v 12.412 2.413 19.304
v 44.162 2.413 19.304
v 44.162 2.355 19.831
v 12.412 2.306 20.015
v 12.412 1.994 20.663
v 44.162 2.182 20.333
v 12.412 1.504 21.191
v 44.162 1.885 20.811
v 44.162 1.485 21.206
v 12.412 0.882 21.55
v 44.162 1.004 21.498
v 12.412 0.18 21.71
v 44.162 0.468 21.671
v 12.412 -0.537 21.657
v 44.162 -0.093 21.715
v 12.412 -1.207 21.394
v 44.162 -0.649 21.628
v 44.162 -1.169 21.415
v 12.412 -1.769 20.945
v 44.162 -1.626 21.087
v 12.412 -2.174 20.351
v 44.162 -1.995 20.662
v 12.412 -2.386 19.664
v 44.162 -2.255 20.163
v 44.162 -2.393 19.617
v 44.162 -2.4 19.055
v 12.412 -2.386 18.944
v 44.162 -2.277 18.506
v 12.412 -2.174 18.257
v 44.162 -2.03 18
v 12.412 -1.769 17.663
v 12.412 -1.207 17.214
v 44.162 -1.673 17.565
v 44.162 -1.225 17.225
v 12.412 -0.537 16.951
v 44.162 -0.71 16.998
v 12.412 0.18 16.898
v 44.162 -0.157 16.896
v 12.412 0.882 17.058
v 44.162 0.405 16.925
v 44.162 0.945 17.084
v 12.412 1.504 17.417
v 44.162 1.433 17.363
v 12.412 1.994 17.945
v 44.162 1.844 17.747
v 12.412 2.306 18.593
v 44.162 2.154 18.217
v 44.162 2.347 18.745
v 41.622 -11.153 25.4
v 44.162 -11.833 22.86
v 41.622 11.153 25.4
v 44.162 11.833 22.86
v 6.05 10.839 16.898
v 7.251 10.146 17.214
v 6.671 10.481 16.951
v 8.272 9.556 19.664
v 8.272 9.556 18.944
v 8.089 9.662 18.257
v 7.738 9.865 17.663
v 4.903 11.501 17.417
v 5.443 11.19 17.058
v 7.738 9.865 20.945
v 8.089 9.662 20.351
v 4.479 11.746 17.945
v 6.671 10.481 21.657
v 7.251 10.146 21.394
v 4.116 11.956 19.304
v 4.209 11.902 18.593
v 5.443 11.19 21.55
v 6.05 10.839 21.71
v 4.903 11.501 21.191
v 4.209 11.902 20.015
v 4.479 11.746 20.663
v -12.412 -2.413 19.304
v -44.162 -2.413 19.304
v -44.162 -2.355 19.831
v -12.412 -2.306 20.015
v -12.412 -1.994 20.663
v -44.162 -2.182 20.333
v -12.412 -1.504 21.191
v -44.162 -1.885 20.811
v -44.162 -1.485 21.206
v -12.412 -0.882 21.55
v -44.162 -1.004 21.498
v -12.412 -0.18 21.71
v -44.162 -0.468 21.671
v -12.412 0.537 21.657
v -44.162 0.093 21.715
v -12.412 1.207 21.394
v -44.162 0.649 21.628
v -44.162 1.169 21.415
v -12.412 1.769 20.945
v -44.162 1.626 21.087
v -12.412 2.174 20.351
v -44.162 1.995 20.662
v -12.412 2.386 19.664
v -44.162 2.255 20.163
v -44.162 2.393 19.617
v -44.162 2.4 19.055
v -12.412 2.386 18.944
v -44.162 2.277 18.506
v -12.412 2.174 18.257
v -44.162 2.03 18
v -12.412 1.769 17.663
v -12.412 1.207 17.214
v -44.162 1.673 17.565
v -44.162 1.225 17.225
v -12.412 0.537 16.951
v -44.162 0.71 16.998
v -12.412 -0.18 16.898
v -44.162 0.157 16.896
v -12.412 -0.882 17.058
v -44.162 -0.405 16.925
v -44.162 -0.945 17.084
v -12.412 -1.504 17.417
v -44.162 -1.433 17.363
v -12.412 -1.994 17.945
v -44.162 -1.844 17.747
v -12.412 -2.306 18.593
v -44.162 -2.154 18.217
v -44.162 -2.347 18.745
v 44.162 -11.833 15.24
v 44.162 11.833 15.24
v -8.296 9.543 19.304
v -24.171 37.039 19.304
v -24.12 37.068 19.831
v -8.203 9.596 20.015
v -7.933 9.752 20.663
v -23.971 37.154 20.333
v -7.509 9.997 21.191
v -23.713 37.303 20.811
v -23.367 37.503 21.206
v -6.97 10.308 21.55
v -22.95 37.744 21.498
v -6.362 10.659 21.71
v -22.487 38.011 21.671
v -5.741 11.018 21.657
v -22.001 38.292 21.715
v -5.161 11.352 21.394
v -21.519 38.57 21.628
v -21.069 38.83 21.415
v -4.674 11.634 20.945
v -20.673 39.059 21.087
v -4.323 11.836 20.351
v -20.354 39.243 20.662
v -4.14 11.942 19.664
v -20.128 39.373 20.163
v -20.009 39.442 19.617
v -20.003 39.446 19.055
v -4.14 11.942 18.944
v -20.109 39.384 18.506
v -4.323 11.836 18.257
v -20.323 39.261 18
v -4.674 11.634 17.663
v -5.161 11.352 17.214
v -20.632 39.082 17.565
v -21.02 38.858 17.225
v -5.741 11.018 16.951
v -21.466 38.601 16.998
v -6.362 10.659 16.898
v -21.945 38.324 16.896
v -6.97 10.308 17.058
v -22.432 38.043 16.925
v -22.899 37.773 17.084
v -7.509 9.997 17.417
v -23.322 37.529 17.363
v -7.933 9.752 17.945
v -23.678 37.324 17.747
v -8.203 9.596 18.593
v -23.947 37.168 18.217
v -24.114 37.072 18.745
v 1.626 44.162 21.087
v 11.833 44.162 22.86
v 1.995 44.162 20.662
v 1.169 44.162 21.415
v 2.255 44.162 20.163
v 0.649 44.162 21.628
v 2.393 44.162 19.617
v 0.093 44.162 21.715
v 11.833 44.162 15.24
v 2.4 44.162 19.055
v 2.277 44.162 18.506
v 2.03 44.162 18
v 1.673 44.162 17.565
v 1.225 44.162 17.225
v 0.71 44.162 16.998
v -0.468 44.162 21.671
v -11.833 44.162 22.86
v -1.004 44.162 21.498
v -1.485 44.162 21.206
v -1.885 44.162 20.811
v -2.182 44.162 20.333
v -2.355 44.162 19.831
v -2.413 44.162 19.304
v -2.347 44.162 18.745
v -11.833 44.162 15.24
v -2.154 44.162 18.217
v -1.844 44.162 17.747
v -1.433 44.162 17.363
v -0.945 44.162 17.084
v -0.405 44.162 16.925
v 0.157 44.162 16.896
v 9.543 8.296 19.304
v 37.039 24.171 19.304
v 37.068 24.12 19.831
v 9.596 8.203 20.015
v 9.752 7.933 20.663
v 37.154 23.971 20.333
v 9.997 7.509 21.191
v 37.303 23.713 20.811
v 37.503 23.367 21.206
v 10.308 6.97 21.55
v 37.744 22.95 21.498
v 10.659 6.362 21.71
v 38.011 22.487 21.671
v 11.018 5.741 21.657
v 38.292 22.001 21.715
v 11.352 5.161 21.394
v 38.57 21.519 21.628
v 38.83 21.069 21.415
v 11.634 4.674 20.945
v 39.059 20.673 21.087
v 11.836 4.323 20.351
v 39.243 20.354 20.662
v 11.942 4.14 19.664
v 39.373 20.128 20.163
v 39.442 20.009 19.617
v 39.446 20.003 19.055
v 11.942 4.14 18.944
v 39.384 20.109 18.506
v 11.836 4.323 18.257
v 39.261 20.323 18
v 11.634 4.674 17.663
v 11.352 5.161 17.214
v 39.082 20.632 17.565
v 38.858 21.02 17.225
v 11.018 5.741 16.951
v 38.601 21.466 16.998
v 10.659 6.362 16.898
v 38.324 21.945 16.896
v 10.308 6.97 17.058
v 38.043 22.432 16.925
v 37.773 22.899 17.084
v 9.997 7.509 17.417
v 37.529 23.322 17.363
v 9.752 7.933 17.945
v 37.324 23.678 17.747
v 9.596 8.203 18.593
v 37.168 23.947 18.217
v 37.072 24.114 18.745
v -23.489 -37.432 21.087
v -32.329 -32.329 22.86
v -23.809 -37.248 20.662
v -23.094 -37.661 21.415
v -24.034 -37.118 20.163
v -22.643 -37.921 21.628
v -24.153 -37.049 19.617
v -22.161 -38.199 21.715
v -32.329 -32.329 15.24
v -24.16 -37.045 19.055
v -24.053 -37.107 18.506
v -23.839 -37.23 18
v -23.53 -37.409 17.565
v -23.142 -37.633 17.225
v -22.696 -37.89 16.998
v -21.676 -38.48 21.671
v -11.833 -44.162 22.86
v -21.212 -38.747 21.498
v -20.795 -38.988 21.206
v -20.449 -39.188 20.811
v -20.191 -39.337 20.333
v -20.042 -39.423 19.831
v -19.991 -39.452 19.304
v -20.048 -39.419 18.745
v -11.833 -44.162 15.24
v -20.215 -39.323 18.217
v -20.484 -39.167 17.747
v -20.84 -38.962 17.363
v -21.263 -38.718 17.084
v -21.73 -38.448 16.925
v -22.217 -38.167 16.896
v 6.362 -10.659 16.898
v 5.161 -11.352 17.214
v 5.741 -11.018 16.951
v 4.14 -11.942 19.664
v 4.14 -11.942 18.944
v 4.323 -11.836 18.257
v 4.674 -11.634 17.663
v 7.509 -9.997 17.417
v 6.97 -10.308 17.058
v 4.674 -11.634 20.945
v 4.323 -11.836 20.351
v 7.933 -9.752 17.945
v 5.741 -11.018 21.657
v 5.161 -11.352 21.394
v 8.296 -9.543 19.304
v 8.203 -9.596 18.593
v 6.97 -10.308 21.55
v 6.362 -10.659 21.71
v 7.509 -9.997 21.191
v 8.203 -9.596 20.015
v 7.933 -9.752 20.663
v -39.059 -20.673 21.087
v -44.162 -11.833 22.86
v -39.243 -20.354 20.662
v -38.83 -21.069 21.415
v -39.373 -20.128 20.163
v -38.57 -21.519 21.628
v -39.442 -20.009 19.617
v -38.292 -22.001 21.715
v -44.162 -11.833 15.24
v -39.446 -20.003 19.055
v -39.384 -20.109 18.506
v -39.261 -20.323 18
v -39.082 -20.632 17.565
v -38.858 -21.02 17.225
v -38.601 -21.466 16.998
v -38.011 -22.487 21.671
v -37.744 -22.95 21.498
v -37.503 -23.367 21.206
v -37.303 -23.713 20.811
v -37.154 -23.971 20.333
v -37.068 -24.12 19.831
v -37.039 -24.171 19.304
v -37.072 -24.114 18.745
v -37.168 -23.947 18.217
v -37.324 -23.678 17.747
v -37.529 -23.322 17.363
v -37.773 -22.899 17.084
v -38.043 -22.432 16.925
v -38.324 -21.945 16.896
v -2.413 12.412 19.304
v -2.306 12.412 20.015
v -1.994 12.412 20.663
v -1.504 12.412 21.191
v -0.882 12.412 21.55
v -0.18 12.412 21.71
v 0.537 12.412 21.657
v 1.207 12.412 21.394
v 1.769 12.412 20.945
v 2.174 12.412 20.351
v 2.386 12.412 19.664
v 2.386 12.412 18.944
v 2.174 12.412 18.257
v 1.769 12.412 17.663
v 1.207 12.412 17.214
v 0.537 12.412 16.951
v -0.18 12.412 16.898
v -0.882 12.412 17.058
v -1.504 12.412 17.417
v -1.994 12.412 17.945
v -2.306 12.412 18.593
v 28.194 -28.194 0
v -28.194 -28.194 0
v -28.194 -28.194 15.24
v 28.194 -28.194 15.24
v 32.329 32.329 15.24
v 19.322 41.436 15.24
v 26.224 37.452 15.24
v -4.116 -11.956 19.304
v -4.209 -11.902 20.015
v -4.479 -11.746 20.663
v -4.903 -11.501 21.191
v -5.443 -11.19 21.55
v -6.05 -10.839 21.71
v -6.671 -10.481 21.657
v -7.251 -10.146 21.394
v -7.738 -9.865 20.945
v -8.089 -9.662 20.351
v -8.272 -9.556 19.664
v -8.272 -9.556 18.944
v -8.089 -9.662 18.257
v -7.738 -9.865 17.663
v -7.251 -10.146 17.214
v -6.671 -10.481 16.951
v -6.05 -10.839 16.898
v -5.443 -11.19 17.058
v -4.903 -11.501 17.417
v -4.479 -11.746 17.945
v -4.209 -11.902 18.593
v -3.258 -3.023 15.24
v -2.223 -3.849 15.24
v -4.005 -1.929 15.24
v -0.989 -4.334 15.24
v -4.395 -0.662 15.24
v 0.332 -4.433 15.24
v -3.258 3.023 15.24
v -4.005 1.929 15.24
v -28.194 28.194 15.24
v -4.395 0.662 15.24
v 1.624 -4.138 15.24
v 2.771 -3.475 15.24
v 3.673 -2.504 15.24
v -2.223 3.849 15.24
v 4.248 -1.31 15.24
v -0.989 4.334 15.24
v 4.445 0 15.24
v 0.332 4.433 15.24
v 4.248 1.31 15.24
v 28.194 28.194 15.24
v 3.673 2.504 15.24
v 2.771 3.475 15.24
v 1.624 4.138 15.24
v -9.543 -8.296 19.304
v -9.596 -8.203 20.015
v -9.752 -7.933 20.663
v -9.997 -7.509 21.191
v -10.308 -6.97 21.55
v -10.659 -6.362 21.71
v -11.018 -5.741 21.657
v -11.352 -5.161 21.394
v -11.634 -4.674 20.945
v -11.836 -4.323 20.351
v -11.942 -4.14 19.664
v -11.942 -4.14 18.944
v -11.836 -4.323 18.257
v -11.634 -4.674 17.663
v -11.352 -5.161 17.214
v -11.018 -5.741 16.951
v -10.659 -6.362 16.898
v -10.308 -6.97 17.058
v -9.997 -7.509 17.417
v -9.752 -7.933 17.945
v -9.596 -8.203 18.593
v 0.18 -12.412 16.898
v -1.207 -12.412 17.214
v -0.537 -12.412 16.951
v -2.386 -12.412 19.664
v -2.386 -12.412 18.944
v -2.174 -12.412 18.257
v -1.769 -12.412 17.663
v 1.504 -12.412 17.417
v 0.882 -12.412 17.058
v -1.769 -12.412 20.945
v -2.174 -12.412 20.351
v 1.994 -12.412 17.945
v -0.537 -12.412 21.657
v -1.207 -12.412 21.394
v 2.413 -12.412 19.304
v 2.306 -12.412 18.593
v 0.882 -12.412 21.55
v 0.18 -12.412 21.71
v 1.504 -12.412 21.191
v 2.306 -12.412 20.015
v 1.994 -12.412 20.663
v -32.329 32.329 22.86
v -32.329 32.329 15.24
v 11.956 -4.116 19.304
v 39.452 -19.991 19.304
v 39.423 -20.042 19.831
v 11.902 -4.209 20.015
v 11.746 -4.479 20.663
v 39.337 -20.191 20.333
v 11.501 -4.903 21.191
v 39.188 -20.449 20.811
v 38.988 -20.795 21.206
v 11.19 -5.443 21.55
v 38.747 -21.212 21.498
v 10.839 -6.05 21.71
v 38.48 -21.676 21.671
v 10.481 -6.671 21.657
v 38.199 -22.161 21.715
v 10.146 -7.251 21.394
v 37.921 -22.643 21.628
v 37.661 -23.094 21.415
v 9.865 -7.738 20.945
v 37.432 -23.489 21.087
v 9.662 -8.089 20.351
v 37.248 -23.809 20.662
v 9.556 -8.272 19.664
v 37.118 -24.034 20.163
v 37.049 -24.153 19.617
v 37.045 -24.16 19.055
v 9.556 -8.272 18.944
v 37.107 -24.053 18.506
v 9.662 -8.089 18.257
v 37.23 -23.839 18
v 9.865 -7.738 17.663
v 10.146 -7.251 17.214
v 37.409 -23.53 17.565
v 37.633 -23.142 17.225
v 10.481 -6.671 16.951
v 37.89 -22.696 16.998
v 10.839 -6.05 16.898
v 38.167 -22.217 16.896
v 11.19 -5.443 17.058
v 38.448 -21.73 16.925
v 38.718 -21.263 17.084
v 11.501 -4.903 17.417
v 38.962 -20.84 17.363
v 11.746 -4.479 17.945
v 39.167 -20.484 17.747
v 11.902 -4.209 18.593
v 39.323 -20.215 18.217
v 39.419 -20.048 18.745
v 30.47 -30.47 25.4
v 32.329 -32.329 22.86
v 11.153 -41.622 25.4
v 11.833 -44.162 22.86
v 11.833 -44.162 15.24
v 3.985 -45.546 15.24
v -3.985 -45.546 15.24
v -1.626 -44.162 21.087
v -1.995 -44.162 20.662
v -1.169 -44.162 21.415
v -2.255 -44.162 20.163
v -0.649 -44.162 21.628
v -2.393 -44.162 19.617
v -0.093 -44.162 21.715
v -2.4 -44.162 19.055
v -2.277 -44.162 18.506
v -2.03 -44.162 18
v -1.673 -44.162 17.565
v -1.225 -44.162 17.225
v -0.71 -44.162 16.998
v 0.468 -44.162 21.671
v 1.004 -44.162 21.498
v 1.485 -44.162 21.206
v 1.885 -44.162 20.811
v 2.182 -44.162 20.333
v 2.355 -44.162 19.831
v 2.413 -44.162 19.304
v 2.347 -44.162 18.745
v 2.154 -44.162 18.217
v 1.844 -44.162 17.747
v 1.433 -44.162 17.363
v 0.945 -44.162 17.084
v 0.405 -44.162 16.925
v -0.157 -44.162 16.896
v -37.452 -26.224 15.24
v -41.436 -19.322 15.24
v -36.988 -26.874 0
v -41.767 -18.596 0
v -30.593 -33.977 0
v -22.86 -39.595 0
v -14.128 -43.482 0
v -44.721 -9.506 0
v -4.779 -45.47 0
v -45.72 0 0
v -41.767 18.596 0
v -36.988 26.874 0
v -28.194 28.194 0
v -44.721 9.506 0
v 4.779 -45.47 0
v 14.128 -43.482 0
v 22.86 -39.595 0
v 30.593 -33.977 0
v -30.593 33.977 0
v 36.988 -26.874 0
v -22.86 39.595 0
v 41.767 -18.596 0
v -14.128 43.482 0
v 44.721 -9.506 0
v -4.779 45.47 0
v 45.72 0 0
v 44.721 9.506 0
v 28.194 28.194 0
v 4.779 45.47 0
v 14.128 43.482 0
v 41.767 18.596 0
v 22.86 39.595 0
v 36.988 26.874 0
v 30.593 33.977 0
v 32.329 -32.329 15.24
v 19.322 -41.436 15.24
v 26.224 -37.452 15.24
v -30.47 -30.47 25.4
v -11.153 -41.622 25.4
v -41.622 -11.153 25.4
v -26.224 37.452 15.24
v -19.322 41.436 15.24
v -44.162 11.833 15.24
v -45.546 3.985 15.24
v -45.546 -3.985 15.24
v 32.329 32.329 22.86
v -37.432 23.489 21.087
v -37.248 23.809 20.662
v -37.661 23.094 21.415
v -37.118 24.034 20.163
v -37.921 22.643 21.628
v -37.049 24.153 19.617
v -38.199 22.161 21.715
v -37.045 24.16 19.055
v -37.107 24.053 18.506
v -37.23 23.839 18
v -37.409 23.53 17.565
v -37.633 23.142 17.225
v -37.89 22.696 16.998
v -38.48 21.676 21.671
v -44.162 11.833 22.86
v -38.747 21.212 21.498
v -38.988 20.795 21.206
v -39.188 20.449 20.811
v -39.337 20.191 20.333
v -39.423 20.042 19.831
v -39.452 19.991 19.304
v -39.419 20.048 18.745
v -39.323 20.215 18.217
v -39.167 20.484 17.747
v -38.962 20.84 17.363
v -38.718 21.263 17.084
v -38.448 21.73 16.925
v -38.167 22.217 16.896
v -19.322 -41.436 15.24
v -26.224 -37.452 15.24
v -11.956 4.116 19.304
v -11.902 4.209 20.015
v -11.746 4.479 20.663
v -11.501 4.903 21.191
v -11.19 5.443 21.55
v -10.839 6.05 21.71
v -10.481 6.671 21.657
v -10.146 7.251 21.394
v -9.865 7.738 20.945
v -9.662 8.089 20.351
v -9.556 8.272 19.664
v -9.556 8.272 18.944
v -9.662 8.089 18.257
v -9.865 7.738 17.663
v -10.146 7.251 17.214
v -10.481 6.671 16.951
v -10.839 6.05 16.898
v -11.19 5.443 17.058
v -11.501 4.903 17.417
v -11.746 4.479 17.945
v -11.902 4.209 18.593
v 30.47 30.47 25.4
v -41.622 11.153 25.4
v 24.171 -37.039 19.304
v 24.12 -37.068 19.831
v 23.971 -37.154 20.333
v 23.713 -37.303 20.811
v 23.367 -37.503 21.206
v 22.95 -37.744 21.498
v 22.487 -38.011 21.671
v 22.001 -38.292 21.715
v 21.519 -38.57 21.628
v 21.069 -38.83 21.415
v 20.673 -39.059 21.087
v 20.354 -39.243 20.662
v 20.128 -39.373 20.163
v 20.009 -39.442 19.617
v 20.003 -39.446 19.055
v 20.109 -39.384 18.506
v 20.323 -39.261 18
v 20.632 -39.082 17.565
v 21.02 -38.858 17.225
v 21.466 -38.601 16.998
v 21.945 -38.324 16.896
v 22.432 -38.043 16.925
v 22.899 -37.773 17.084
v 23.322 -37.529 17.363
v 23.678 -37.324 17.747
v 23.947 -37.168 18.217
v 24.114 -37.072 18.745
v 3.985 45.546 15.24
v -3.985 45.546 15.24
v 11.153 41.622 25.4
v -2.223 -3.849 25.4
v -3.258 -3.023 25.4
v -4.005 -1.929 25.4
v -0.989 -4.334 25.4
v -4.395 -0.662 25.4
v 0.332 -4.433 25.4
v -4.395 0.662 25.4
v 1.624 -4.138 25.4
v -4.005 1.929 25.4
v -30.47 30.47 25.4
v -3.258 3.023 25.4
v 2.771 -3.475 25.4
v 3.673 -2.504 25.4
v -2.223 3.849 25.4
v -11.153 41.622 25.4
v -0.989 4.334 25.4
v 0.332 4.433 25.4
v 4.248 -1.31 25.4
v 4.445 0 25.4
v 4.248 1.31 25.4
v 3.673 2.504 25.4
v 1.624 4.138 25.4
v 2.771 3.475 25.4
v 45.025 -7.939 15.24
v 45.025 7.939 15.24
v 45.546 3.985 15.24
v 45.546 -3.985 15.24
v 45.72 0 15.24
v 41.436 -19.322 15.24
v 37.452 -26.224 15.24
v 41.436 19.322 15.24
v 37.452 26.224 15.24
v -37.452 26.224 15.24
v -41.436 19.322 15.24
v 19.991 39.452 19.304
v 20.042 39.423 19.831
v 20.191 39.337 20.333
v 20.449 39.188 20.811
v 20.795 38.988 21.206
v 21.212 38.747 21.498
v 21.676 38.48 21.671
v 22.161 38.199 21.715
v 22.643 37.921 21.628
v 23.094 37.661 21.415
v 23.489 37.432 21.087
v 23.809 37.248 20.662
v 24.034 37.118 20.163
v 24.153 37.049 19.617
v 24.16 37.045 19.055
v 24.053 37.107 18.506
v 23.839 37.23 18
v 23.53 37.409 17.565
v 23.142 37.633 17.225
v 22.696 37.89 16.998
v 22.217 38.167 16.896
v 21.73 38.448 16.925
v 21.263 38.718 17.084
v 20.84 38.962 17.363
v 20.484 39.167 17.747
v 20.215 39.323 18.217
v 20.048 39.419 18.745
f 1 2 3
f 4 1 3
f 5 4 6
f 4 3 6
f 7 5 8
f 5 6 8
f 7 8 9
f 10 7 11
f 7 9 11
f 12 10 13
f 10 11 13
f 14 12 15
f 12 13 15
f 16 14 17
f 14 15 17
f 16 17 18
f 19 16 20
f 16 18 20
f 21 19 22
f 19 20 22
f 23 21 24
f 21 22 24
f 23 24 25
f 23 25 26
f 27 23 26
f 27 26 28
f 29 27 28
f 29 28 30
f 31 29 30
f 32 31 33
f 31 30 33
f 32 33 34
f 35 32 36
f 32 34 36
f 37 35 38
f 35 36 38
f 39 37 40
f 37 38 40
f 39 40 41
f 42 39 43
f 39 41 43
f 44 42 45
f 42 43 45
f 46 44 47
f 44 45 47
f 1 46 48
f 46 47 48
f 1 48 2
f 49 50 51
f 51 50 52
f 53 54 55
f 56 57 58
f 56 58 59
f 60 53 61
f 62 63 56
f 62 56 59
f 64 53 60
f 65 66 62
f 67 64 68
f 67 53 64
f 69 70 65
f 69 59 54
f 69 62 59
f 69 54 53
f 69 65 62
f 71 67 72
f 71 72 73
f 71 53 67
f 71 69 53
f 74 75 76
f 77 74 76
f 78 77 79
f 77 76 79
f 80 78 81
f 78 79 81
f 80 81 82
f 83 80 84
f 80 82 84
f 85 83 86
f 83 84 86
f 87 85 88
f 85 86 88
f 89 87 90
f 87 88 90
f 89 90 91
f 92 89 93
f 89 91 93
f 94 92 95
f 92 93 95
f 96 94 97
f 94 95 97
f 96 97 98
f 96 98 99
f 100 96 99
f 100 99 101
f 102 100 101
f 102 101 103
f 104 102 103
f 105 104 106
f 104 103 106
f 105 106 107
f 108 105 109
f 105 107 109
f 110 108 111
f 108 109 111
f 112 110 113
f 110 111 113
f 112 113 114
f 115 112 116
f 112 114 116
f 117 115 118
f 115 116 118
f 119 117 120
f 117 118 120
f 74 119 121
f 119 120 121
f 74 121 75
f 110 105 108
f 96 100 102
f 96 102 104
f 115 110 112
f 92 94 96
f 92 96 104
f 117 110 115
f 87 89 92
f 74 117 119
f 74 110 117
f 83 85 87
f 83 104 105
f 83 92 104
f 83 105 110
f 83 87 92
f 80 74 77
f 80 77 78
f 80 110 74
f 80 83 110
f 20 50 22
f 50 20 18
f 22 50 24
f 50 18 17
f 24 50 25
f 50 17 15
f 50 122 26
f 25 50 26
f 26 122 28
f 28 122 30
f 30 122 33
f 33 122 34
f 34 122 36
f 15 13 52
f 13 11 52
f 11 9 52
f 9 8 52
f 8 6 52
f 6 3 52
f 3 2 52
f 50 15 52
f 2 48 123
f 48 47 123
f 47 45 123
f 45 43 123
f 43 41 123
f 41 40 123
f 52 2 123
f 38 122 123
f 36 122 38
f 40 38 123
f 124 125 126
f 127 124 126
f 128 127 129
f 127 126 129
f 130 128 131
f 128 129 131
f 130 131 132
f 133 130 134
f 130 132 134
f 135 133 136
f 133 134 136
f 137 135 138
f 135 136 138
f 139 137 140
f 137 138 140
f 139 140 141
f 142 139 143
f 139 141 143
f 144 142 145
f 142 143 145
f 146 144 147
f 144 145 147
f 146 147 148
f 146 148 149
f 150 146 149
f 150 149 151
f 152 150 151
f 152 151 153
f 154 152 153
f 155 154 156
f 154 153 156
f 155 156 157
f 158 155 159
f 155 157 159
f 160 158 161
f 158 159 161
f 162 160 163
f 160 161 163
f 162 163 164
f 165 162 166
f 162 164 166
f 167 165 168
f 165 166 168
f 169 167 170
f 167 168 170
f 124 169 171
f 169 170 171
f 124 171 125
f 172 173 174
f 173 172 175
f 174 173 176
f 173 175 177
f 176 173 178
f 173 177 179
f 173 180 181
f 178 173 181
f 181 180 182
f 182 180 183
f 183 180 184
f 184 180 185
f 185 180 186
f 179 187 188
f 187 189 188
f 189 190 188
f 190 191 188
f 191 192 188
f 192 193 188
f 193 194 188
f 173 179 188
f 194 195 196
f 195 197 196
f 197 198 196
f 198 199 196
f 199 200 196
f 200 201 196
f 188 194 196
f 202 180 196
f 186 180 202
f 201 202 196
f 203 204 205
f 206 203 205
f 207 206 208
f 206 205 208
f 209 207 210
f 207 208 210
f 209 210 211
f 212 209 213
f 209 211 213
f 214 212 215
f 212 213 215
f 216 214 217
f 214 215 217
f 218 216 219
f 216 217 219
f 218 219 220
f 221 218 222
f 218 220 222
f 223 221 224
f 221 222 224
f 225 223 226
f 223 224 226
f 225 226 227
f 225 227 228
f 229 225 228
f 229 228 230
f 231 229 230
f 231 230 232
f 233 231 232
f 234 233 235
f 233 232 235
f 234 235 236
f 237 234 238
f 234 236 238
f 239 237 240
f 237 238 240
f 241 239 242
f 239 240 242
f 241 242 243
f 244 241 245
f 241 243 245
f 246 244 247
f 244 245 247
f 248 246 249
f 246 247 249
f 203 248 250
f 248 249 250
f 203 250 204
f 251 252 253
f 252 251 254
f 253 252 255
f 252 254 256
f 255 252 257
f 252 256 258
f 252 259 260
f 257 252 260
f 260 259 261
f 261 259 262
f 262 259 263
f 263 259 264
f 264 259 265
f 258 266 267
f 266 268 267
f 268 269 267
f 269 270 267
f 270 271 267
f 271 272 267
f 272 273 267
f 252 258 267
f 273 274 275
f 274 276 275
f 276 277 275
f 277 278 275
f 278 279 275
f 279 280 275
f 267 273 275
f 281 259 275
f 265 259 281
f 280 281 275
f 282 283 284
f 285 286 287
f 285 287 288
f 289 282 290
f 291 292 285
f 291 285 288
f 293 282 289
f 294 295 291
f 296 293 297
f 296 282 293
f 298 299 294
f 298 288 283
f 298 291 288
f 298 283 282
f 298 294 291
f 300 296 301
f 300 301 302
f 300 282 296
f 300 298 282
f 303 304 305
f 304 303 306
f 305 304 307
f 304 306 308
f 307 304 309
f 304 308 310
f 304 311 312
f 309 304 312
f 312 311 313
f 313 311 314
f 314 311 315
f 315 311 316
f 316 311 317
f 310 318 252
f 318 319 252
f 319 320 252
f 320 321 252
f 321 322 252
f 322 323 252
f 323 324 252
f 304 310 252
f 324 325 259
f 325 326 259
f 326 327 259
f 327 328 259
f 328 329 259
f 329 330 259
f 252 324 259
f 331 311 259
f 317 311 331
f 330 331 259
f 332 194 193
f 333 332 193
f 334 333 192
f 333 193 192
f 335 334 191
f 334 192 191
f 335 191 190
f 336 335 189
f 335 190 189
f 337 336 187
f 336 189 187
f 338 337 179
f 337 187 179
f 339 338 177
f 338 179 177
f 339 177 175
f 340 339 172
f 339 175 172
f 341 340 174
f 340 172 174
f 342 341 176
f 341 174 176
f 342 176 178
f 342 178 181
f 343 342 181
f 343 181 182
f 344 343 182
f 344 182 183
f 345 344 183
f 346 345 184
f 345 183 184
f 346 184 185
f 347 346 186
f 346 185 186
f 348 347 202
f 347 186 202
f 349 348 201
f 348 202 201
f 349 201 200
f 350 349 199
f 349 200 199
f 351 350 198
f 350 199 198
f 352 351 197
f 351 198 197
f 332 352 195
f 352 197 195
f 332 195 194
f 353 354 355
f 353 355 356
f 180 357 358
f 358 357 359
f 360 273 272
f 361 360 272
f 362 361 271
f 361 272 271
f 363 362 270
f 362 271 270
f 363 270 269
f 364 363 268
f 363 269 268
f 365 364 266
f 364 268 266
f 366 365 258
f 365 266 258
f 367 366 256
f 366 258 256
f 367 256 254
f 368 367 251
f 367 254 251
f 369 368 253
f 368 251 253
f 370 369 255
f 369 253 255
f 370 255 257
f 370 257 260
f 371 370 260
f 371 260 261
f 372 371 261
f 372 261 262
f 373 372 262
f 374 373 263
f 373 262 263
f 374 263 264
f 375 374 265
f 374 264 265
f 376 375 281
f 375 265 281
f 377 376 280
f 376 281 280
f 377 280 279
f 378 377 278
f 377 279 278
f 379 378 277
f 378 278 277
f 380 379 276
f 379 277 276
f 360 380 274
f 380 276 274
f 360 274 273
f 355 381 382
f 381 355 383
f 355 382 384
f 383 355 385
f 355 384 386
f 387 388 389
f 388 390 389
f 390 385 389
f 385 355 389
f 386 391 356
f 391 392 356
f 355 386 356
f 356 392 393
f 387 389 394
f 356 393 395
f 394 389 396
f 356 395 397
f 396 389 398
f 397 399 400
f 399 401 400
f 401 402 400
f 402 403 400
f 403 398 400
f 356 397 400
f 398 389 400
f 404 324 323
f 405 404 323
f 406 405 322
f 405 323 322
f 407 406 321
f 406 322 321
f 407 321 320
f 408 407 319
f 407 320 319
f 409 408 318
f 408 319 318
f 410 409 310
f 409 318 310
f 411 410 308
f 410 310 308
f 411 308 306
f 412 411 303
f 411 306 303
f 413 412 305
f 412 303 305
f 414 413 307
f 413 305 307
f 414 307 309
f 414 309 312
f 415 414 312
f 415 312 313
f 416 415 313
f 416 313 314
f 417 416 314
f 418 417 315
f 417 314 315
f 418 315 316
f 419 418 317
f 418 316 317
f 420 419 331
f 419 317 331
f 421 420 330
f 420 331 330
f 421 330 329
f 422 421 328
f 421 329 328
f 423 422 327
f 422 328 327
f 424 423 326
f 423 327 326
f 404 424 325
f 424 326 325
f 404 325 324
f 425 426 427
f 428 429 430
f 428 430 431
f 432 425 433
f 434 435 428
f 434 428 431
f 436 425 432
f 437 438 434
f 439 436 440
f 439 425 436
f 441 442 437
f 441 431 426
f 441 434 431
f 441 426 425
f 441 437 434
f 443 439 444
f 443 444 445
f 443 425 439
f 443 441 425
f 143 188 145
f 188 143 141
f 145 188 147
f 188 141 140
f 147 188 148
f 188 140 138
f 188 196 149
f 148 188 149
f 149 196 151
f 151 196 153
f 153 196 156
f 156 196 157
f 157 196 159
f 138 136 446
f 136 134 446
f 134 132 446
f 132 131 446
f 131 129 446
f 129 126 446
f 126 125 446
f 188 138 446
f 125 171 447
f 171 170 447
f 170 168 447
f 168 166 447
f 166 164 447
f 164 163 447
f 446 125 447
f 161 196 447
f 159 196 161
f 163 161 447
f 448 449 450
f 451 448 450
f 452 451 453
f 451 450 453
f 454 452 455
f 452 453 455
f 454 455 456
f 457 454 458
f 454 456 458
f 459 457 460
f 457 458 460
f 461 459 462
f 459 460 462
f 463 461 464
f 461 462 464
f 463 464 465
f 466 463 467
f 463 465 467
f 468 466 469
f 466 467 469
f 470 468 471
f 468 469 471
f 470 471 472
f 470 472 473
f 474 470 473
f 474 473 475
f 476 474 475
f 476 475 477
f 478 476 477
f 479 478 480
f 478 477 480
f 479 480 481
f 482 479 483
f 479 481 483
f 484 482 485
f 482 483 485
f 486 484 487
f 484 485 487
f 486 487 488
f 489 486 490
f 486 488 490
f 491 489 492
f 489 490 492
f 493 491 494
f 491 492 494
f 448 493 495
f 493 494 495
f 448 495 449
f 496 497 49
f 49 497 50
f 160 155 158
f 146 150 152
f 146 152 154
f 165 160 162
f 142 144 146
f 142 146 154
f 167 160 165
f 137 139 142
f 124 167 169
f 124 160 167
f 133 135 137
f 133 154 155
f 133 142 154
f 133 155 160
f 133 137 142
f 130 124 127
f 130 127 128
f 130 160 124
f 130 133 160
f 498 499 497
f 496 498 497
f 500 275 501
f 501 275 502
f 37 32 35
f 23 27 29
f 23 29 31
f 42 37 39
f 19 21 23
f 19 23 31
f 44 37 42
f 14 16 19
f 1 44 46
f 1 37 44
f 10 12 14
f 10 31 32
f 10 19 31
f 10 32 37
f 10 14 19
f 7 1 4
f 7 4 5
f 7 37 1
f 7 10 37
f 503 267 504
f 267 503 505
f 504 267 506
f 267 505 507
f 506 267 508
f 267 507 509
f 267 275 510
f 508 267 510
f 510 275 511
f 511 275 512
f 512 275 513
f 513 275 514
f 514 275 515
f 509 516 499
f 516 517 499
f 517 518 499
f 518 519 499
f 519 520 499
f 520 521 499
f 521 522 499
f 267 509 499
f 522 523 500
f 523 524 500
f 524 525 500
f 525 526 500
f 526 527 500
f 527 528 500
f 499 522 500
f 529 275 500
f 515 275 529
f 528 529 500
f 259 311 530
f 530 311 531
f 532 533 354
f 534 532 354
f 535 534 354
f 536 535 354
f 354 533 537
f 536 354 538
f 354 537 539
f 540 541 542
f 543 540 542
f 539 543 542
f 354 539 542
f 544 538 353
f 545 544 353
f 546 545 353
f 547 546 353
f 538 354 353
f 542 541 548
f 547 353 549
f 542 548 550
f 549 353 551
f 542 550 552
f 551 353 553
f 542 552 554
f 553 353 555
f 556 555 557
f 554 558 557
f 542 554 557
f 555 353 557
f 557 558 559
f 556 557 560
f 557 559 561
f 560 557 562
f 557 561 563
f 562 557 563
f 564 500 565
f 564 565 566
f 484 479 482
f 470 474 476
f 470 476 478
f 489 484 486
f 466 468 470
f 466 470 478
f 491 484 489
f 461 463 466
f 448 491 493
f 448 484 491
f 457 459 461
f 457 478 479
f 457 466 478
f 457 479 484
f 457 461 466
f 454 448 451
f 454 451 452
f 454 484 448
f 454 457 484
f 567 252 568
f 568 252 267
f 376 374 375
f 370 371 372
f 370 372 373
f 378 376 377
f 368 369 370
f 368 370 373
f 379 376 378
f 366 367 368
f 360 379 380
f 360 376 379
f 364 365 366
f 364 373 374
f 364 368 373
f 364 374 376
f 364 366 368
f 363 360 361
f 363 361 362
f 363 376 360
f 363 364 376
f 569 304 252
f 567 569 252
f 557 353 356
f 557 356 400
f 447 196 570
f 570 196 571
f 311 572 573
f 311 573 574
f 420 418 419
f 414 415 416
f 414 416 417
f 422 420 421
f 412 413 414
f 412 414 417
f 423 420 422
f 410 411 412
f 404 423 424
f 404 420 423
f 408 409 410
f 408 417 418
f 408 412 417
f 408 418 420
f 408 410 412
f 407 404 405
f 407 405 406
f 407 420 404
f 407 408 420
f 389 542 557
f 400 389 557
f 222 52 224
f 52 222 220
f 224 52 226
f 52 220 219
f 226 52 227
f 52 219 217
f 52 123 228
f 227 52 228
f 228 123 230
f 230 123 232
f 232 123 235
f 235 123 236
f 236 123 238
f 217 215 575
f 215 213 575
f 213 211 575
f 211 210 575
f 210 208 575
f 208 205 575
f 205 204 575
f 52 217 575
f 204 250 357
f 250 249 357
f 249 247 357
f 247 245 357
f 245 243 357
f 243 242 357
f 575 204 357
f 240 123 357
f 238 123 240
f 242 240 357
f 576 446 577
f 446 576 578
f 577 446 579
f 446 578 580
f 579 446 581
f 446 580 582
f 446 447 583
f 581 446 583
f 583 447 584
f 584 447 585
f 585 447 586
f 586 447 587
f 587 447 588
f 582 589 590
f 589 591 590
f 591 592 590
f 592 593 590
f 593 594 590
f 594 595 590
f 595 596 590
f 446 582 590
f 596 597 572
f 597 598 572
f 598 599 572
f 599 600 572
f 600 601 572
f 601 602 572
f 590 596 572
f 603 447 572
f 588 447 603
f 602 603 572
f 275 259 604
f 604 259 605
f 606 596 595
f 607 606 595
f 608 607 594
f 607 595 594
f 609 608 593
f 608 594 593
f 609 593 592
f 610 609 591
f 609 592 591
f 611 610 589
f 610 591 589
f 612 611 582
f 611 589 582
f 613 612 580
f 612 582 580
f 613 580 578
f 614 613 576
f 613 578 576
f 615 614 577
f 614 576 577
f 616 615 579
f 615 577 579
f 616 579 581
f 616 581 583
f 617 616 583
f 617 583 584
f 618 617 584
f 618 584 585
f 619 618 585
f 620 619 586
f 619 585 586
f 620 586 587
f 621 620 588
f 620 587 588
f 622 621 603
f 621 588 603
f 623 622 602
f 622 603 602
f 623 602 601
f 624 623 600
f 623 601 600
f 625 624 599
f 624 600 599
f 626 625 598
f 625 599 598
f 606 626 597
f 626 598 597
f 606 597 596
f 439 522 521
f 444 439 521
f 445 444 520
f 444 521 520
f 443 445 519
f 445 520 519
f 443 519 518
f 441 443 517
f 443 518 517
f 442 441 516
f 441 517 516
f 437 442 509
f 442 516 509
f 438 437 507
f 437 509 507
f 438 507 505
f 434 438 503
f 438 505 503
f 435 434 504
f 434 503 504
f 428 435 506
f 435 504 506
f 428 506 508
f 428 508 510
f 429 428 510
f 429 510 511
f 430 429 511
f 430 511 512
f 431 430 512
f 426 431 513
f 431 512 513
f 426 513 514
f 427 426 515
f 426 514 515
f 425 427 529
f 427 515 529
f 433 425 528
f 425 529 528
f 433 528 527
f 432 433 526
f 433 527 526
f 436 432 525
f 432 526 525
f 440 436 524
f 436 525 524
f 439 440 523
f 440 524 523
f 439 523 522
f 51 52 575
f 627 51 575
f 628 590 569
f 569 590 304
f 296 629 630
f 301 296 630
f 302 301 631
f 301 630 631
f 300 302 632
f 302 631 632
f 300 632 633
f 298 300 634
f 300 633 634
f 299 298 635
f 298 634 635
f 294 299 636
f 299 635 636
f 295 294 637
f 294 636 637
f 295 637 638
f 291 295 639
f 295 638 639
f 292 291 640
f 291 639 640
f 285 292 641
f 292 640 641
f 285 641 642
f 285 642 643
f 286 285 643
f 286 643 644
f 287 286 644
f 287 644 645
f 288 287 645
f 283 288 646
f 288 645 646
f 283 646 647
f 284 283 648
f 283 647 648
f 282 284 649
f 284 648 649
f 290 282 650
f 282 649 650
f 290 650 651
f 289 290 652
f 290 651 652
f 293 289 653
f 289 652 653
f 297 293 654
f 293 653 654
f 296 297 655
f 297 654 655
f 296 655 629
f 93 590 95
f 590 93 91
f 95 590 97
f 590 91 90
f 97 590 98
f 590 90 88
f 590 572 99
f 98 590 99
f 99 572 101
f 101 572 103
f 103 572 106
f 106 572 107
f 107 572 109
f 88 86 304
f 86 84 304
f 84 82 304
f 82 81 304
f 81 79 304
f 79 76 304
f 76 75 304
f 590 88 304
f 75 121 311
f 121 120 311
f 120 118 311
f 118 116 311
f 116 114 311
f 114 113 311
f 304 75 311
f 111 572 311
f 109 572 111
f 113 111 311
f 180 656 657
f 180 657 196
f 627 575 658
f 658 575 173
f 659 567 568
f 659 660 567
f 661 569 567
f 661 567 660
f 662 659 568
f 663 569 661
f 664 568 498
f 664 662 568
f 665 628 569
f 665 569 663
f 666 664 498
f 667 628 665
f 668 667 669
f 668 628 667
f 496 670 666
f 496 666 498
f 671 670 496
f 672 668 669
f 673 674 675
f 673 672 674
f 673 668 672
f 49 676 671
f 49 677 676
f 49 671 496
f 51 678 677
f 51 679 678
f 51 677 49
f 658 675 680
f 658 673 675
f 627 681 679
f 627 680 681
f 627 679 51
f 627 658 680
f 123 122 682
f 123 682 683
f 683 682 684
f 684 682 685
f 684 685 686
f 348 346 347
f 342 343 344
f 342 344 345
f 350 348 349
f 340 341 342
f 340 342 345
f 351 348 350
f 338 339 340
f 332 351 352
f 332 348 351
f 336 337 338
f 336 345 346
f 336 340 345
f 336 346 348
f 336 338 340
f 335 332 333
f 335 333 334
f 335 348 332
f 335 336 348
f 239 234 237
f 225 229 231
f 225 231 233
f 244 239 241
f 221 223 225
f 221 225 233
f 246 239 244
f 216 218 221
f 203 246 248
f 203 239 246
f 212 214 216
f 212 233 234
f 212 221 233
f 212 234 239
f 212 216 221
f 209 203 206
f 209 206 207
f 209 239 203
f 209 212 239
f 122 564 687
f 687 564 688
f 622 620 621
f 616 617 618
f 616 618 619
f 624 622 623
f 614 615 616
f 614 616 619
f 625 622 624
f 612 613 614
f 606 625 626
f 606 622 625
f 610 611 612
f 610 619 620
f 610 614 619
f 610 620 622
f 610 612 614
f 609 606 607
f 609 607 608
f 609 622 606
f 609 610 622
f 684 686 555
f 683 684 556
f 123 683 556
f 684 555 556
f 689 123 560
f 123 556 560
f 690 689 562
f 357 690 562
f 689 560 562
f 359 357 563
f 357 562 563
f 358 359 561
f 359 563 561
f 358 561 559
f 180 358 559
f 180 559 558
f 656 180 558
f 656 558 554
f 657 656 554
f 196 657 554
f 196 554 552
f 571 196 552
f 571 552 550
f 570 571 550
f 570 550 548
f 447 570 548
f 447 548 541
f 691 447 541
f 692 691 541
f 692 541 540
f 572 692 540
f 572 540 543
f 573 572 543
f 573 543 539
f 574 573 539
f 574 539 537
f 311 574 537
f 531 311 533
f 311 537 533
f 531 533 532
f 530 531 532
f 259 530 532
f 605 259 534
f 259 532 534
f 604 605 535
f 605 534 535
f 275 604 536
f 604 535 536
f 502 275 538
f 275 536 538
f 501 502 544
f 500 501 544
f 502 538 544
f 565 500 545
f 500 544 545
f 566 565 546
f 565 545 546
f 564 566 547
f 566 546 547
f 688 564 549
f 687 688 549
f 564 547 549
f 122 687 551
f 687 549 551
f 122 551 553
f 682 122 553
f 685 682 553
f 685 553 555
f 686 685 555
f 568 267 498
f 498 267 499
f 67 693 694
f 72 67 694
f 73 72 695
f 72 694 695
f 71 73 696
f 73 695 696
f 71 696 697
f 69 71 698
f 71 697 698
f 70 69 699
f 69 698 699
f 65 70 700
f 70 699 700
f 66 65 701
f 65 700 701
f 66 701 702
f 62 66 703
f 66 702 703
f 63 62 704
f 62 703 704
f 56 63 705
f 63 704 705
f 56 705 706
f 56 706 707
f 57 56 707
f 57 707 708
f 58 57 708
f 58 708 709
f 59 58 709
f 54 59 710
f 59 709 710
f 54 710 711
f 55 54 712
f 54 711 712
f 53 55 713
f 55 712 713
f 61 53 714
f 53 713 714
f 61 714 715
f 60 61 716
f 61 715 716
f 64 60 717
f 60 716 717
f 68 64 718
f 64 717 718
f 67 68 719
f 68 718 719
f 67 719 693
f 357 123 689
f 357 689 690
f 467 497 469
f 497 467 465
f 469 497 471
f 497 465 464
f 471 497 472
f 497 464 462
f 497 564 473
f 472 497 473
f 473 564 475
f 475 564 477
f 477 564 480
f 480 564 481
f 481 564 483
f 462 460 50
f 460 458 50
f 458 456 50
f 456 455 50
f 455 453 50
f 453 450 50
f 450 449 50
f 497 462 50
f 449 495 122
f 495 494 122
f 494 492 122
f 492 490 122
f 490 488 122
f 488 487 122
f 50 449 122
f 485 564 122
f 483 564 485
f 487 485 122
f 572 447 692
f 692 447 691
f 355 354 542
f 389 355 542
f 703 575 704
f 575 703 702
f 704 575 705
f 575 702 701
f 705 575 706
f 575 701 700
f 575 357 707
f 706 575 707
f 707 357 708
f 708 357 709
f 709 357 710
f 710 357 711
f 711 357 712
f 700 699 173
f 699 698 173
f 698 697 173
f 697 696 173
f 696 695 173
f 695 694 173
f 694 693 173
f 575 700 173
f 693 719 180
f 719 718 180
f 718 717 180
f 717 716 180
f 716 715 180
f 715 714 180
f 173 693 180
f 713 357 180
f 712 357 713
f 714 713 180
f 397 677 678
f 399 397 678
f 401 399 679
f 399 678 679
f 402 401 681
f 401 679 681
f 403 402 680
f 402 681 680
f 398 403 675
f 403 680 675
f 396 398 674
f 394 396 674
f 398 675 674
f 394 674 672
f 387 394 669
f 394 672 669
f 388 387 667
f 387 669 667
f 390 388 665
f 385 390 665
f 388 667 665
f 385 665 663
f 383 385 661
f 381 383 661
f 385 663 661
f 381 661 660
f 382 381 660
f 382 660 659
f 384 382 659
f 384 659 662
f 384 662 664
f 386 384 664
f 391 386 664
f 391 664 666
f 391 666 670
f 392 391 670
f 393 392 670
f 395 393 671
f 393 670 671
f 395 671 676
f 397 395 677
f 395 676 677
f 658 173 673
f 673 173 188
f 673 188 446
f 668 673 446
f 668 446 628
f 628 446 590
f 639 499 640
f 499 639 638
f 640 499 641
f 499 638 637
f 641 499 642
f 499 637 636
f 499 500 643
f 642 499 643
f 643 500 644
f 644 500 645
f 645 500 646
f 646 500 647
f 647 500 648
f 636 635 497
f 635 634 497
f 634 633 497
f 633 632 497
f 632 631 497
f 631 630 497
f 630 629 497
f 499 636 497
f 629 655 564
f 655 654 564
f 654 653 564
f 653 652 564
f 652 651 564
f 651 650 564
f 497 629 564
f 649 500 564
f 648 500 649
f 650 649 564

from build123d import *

# Parameters (mm, degrees)
F0_R     = 45.72
F0_W     = 56.388
F0_H     = 56.388
F1_DEPTH = 15.24
F2_W     = 56.388
F2_H     = 56.388
F3_DEPTH = 10.16
F4_W     = 56.388
F4_H     = 56.388
F4_R     = 4.445
F5_DEPTH = 10.16
F6_R     = 2.413
F7_DEPTH = 31.75
F8_COUNT = 12
F9_SIZE  = 2.54


with BuildPart() as f1:
    # F0 (on Top) → F1 (new body)
    with BuildSketch(Plane.XY):
        Circle(F0_R)
        Rectangle(F0_W, F0_H, mode=Mode.SUBTRACT)
    extrude(amount=F1_DEPTH)

    # F2 (on face) → F3 (join)
    with BuildSketch(Plane.XY.offset(15.24)):
        Polygon((11.833207, 44.162129), (-11.833207, 44.162129), (-32.328922, 32.328922), (-44.162129, 11.833207), (-44.162129, -11.833207), (-32.328922, -32.328922), (-11.833207, -44.162129), (11.833207, -44.162129), (32.328922, -32.328922), (44.162129, -11.833207), (44.162129, 11.833207), (32.328922, 32.328922), align=None)
        Rectangle(F2_W, F2_H, mode=Mode.SUBTRACT)
    extrude(amount=F3_DEPTH)

    # F4 (on face) → F5 (join)
    with BuildSketch(Plane.XY.offset(25.4)):
        Rectangle(F4_W, F4_H)
        Circle(F4_R, mode=Mode.SUBTRACT)
    extrude(amount=-F5_DEPTH)

    # F9
    f9_edges = [f1.edges().sort_by_distance(p)[0] for p in [
        (38.245525, 22.081064, 25.4),
        (22.081064, 38.245525, 25.4),
        (0, 44.162129, 25.4),
        (44.162129, 0, 25.4),
        (38.245525, -22.081064, 25.4),
        (22.081064, -38.245525, 25.4),
        (0, -44.162129, 25.4),
        (-22.081064, -38.245525, 25.4),
        (-38.245525, -22.081064, 25.4),
        (-44.162129, 0, 25.4),
        (-38.245525, 22.081064, 25.4),
        (-22.081064, 38.245525, 25.4),
    ]]
    chamfer(f9_edges, length=F9_SIZE)


with BuildPart() as f7:
    # F6 (on face) → F7 (new body, symmetric)
    with BuildSketch(Plane(origin=(-38.245525, -22.081064, 0), x_dir=(0.5, -0.866025, 0), z_dir=(-0.866025, -0.5, 0))):
        with Locations((0, 19.304)):
            Circle(F6_R)
    extrude(amount=F7_DEPTH, both=True)


with BuildPart() as f8_1:
    # F8: instance of F7
    add(f7.part.rotate(Axis((0, 0, 25.4), (0, 0, 1)), 1 * 360 / F8_COUNT))


with BuildPart() as f8_2:
    # F8: instance of F7
    add(f7.part.rotate(Axis((0, 0, 25.4), (0, 0, 1)), 2 * 360 / F8_COUNT))


with BuildPart() as f8_3:
    # F8: instance of F7
    add(f7.part.rotate(Axis((0, 0, 25.4), (0, 0, 1)), 3 * 360 / F8_COUNT))


with BuildPart() as f8_4:
    # F8: instance of F7
    add(f7.part.rotate(Axis((0, 0, 25.4), (0, 0, 1)), 4 * 360 / F8_COUNT))


with BuildPart() as f8_5:
    # F8: instance of F7
    add(f7.part.rotate(Axis((0, 0, 25.4), (0, 0, 1)), 5 * 360 / F8_COUNT))


with BuildPart() as f8_6:
    # F8: instance of F7
    add(f7.part.rotate(Axis((0, 0, 25.4), (0, 0, 1)), 6 * 360 / F8_COUNT))


with BuildPart() as f8_7:
    # F8: instance of F7
    add(f7.part.rotate(Axis((0, 0, 25.4), (0, 0, 1)), 7 * 360 / F8_COUNT))


with BuildPart() as f8_8:
    # F8: instance of F7
    add(f7.part.rotate(Axis((0, 0, 25.4), (0, 0, 1)), 8 * 360 / F8_COUNT))


with BuildPart() as f8_9:
    # F8: instance of F7
    add(f7.part.rotate(Axis((0, 0, 25.4), (0, 0, 1)), 9 * 360 / F8_COUNT))


with BuildPart() as f8_10:
    # F8: instance of F7
    add(f7.part.rotate(Axis((0, 0, 25.4), (0, 0, 1)), 10 * 360 / F8_COUNT))


with BuildPart() as f8_11:
    # F8: instance of F7
    add(f7.part.rotate(Axis((0, 0, 25.4), (0, 0, 1)), 11 * 360 / F8_COUNT))


with BuildPart() as f1_1:
    add(f1.part)

    # F10: cut F8_2, F8_1, F7, F8_11, F8_10, F8_9, F8_8, F8_7, F8_6, F8_5, F8_4, F8_3
    add(f8_2.part, mode=Mode.SUBTRACT)
    add(f8_1.part, mode=Mode.SUBTRACT)
    add(f7.part, mode=Mode.SUBTRACT)
    add(f8_11.part, mode=Mode.SUBTRACT)
    add(f8_10.part, mode=Mode.SUBTRACT)
    add(f8_9.part, mode=Mode.SUBTRACT)
    add(f8_8.part, mode=Mode.SUBTRACT)
    add(f8_7.part, mode=Mode.SUBTRACT)
    add(f8_6.part, mode=Mode.SUBTRACT)
    add(f8_5.part, mode=Mode.SUBTRACT)
    add(f8_4.part, mode=Mode.SUBTRACT)
    add(f8_3.part, mode=Mode.SUBTRACT)


solid = f1_1.part
